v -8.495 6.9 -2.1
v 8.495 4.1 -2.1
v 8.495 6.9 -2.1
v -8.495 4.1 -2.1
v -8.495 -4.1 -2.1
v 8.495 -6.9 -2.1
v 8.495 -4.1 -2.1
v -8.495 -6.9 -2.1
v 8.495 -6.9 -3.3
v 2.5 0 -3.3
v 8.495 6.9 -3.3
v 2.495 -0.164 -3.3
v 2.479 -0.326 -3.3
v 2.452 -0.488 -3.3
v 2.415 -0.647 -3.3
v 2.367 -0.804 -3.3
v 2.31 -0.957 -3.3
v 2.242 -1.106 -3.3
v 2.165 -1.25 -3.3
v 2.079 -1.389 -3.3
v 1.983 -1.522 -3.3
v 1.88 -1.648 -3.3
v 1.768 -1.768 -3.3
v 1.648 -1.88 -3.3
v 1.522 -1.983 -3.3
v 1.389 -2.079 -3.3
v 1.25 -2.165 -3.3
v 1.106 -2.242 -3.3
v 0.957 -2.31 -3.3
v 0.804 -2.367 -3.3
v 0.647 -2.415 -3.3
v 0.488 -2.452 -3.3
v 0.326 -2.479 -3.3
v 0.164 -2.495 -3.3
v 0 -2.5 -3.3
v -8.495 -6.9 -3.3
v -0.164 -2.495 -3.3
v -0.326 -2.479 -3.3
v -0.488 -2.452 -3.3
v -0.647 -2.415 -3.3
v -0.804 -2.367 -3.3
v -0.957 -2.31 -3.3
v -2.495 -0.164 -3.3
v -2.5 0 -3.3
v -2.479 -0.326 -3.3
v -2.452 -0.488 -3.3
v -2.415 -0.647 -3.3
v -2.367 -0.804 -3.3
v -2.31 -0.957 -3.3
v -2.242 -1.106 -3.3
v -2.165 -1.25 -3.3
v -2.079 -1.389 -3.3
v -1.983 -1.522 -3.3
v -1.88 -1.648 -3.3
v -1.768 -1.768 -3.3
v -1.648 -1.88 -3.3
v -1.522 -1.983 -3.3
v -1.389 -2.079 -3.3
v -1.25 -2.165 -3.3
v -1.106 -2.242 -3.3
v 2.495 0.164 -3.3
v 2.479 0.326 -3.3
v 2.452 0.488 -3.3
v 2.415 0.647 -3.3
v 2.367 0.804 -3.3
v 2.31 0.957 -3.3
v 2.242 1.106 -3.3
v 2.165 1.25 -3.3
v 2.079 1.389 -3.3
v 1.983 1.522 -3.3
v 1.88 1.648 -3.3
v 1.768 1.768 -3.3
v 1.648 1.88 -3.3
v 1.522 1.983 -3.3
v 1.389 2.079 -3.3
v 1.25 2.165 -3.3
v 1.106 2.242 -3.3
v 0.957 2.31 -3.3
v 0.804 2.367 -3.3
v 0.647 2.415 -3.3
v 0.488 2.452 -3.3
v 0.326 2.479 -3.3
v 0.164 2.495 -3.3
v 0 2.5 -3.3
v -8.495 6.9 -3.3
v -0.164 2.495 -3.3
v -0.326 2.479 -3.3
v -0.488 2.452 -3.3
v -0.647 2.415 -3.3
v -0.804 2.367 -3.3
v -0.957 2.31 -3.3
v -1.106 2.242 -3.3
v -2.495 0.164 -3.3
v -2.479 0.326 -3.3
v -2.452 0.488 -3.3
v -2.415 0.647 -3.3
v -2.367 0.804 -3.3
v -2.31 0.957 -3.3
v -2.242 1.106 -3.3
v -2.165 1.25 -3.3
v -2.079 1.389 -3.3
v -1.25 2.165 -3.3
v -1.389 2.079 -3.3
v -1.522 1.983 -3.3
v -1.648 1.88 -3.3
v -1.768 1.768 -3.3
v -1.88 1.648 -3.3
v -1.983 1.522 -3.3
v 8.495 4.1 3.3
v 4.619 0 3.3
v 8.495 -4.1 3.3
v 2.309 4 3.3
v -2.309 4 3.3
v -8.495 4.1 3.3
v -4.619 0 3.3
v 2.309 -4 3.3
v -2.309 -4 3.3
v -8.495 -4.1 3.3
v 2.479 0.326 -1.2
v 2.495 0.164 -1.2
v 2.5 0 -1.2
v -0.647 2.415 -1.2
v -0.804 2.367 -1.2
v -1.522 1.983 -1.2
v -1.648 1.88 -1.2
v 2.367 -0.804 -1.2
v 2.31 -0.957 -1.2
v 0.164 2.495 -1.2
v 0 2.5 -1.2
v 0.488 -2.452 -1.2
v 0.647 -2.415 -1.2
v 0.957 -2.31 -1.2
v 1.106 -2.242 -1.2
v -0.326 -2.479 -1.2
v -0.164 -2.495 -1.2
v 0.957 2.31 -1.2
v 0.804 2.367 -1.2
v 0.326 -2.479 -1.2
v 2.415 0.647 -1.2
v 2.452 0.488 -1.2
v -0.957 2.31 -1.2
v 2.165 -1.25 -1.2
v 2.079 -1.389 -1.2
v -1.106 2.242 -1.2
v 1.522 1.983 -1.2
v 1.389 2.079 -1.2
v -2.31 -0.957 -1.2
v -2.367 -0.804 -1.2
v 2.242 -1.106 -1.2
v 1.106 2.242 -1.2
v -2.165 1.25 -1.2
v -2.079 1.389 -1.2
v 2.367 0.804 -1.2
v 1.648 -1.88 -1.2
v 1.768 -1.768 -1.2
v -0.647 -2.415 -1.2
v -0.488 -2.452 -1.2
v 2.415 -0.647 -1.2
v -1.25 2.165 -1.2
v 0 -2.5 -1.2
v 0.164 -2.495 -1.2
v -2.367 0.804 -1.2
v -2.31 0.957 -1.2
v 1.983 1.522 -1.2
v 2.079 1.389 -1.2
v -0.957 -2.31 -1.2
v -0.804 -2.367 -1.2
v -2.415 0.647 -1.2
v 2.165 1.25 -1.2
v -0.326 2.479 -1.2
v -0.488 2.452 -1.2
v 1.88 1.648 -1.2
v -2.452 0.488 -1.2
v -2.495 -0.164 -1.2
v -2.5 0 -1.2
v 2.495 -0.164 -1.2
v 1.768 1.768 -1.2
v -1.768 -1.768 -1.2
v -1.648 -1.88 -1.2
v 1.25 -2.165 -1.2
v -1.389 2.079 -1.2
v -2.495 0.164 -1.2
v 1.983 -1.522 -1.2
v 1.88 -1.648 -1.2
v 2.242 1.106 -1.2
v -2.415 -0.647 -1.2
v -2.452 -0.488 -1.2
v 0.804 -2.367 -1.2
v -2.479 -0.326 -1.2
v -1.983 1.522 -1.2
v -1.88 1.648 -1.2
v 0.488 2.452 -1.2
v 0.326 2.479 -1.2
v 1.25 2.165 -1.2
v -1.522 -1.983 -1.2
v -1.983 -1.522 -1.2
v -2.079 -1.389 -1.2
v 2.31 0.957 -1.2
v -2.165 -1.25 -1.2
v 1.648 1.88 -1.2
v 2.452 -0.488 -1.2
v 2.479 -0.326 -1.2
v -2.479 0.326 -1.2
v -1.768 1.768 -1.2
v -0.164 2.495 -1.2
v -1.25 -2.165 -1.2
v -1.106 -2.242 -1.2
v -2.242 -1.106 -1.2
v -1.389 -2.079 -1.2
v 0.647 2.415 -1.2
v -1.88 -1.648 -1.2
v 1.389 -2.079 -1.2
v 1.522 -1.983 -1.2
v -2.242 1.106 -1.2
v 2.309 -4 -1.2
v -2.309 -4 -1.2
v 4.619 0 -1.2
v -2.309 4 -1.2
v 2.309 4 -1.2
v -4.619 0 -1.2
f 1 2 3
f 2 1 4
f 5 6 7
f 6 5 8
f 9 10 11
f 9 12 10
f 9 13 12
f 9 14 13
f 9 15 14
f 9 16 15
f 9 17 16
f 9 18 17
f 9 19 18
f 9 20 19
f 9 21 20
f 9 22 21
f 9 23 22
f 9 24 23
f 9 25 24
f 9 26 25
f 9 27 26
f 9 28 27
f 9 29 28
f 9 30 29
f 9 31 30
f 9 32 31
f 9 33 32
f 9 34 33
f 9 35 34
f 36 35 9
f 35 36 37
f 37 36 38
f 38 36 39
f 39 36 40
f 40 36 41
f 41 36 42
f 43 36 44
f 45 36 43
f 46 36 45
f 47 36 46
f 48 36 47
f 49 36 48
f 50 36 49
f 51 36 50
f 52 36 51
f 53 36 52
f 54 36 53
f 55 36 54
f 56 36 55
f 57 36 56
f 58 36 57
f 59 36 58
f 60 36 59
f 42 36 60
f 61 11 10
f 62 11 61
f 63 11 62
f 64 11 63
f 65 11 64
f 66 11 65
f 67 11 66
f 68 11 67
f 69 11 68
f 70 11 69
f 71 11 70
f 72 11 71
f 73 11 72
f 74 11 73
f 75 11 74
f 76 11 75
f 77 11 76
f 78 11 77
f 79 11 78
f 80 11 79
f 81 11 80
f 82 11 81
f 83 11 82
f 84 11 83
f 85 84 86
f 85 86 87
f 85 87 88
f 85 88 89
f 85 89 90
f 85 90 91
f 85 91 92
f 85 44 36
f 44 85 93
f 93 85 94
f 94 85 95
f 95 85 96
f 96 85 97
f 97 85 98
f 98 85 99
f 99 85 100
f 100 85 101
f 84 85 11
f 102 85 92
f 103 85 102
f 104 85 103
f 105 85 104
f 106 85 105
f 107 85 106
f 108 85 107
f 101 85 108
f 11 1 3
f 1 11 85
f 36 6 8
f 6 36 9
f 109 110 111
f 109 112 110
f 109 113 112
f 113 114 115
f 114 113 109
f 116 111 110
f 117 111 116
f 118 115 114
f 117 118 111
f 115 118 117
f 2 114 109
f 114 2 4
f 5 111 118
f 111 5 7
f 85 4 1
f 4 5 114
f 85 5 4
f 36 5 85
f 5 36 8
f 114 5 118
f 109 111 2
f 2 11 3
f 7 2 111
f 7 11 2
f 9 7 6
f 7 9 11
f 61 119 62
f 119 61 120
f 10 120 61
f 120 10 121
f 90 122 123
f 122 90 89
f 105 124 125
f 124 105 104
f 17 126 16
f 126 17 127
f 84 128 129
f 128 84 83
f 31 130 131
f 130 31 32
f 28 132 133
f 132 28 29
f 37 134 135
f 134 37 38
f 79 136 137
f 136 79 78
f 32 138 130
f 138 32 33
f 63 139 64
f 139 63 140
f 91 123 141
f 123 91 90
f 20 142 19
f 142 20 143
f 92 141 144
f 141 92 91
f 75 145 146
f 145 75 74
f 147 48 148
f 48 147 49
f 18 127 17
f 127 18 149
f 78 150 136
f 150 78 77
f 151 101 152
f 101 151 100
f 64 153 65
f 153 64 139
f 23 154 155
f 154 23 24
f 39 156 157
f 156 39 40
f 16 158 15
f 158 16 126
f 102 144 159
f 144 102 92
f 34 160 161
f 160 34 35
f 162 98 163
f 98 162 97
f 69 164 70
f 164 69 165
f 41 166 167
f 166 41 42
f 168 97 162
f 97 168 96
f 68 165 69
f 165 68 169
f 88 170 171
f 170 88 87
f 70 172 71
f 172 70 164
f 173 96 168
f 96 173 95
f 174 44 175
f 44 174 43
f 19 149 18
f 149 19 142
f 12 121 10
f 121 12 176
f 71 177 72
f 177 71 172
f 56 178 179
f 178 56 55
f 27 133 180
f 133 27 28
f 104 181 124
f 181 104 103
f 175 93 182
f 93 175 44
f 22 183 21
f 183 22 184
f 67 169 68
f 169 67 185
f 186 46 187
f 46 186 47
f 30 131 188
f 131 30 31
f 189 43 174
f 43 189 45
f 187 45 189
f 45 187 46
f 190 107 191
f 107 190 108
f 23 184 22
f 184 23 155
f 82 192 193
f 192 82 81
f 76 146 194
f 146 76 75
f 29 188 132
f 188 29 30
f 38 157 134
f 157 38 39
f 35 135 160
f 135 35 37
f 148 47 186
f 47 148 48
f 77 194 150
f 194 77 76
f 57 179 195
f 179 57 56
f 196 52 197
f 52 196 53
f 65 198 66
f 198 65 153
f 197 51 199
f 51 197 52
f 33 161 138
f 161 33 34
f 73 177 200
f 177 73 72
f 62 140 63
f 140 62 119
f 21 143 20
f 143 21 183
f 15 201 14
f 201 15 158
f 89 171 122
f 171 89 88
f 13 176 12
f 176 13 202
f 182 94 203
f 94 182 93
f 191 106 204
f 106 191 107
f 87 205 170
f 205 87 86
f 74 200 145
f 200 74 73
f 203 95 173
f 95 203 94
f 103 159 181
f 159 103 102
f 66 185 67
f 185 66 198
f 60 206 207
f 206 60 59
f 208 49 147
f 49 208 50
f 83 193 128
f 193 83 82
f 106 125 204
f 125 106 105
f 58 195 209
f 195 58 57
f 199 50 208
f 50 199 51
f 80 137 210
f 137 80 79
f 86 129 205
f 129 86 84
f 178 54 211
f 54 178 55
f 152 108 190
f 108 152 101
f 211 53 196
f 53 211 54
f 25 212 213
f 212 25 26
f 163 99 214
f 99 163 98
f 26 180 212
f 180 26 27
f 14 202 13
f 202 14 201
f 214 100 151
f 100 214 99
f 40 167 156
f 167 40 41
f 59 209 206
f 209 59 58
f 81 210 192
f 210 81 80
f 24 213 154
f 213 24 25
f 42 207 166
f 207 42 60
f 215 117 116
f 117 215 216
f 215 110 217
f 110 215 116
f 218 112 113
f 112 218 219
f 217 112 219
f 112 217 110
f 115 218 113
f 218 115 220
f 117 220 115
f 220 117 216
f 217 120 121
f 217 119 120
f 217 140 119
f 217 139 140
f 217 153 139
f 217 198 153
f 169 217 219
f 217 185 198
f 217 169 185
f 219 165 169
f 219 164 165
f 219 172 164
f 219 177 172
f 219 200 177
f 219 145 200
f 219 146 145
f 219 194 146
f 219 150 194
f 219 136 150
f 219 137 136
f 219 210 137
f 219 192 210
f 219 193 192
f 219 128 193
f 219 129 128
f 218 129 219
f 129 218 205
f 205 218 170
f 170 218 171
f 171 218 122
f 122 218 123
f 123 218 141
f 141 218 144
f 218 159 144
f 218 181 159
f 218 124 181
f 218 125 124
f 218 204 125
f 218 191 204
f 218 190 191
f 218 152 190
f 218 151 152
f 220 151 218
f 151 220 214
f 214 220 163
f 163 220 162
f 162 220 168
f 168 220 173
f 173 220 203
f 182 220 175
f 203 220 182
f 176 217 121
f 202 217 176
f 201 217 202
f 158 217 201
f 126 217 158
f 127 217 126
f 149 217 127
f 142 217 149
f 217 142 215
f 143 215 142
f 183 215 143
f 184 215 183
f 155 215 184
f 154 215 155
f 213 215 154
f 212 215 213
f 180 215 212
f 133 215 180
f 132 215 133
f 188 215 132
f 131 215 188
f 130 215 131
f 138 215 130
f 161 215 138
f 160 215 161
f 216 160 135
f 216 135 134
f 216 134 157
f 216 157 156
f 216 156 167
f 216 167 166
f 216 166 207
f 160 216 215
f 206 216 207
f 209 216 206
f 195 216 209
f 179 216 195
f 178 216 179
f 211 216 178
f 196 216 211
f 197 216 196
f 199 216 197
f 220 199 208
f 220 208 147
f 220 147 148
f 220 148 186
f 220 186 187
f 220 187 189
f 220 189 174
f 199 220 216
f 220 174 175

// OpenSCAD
$fn = 96;

// -------------------- Parameters (requested key dims) --------------------
screw_diameter_mm = 6.0;                 // M6 nominal
internal_hex_across_flats_mm = 8.0;      // hex socket AF
thickness_mm = 6.6;                      // overall nut thickness (Z)
body_length_mm = 18;                     // along slot (X)

// Typical 3030/3060 style T-slot nut envelope (can be adjusted)
t_slot_width_mm = 13.8;                  // max width that sits under slot lips (Y)
t_slot_opening_width_mm = 8.2;           // slot opening/neck width (Y)
t_slot_lip_thickness_mm = 1.2;           // lip capture height (Z) on each side
chamfer_mm = 0.5;
overlap_mm = 0.6;

// Hole options
hole_type_is_tapped = 1;                 // 1=tapped pilot, 0=clearance
clearance_diameter_mm = 6.6;
tapped_pilot_diameter_mm = 5.0;

// Hex socket depth (from top face down)
hex_socket_depth_mm = 4.5;

// -------------------- Helpers --------------------
function hex_circumradius_from_af(af) = af / (2 * cos(30)); // AF -> circumscribed radius

module chamfer_ends(len, wid, h, c) {
    // subtract two wedges to chamfer the X ends
    // uses hull between a thin slice and a shifted slice to create a 45-ish chamfer
    for (sx = [-1, 1]) {
        translate([sx*(len/2 - c/2), 0, 0])
            hull() {
                translate([sx*c/2, 0, 0]) cube([c, wid + 2*overlap_mm, h + 2*overlap_mm], center=true);
                translate([-sx*c/2, 0, 0]) cube([0.01, wid + 2*overlap_mm, h + 2*overlap_mm], center=true);
            }
    }
}

// -------------------- Main T-slot nut --------------------
module tslot_nut() {
    // Derived geometry for a recognizable T-slot nut profile:
    // - Bottom "head" width = t_slot_width_mm
    // - Top "neck" width = t_slot_opening_width_mm
    // - Neck height = thickness - lip_thickness (captures under lips)
    // - Head height = lip_thickness (sits below opening)
    head_h = t_slot_lip_thickness_mm;
    neck_h = thickness_mm - head_h;

    // Ensure sane
    head_h2 = max(0.6, min(head_h, thickness_mm - 0.6));
    neck_h2 = thickness_mm - head_h2;

    difference() {
        // ONE connected solid: union of head + neck with overlap
        union() {
            // Bottom head (wider) centered at bottom portion
            translate([0, 0, -thickness_mm/2 + head_h2/2])
                cube([body_length_mm, t_slot_width_mm, head_h2], center=true);

            // Top neck (narrower) centered above, overlapping slightly into head
            translate([0, 0, -thickness_mm/2 + head_h2 + neck_h2/2 - overlap_mm/2])
                cube([body_length_mm, t_slot_opening_width_mm, neck_h2 + overlap_mm], center=true);
        }

        // End chamfers (subtract from the combined body)
        chamfer_ends(body_length_mm, t_slot_width_mm, thickness_mm, chamfer_mm);

        // Through hole (pilot for tapping or clearance)
        cylinder(d = (hole_type_is_tapped ? tapped_pilot_diameter_mm : clearance_diameter_mm),
                 h = thickness_mm + 2*overlap_mm, center=true);

        // Internal hex socket from top face down
        translate([0, 0, thickness_mm/2 - hex_socket_depth_mm/2 + overlap_mm/2])
            cylinder(r = hex_circumradius_from_af(internal_hex_across_flats_mm),
                     h = hex_socket_depth_mm + overlap_mm, center=true, $fn=6);
    }
}

// -------------------- Assembly (single connected solid) --------------------
tslot_nut();
